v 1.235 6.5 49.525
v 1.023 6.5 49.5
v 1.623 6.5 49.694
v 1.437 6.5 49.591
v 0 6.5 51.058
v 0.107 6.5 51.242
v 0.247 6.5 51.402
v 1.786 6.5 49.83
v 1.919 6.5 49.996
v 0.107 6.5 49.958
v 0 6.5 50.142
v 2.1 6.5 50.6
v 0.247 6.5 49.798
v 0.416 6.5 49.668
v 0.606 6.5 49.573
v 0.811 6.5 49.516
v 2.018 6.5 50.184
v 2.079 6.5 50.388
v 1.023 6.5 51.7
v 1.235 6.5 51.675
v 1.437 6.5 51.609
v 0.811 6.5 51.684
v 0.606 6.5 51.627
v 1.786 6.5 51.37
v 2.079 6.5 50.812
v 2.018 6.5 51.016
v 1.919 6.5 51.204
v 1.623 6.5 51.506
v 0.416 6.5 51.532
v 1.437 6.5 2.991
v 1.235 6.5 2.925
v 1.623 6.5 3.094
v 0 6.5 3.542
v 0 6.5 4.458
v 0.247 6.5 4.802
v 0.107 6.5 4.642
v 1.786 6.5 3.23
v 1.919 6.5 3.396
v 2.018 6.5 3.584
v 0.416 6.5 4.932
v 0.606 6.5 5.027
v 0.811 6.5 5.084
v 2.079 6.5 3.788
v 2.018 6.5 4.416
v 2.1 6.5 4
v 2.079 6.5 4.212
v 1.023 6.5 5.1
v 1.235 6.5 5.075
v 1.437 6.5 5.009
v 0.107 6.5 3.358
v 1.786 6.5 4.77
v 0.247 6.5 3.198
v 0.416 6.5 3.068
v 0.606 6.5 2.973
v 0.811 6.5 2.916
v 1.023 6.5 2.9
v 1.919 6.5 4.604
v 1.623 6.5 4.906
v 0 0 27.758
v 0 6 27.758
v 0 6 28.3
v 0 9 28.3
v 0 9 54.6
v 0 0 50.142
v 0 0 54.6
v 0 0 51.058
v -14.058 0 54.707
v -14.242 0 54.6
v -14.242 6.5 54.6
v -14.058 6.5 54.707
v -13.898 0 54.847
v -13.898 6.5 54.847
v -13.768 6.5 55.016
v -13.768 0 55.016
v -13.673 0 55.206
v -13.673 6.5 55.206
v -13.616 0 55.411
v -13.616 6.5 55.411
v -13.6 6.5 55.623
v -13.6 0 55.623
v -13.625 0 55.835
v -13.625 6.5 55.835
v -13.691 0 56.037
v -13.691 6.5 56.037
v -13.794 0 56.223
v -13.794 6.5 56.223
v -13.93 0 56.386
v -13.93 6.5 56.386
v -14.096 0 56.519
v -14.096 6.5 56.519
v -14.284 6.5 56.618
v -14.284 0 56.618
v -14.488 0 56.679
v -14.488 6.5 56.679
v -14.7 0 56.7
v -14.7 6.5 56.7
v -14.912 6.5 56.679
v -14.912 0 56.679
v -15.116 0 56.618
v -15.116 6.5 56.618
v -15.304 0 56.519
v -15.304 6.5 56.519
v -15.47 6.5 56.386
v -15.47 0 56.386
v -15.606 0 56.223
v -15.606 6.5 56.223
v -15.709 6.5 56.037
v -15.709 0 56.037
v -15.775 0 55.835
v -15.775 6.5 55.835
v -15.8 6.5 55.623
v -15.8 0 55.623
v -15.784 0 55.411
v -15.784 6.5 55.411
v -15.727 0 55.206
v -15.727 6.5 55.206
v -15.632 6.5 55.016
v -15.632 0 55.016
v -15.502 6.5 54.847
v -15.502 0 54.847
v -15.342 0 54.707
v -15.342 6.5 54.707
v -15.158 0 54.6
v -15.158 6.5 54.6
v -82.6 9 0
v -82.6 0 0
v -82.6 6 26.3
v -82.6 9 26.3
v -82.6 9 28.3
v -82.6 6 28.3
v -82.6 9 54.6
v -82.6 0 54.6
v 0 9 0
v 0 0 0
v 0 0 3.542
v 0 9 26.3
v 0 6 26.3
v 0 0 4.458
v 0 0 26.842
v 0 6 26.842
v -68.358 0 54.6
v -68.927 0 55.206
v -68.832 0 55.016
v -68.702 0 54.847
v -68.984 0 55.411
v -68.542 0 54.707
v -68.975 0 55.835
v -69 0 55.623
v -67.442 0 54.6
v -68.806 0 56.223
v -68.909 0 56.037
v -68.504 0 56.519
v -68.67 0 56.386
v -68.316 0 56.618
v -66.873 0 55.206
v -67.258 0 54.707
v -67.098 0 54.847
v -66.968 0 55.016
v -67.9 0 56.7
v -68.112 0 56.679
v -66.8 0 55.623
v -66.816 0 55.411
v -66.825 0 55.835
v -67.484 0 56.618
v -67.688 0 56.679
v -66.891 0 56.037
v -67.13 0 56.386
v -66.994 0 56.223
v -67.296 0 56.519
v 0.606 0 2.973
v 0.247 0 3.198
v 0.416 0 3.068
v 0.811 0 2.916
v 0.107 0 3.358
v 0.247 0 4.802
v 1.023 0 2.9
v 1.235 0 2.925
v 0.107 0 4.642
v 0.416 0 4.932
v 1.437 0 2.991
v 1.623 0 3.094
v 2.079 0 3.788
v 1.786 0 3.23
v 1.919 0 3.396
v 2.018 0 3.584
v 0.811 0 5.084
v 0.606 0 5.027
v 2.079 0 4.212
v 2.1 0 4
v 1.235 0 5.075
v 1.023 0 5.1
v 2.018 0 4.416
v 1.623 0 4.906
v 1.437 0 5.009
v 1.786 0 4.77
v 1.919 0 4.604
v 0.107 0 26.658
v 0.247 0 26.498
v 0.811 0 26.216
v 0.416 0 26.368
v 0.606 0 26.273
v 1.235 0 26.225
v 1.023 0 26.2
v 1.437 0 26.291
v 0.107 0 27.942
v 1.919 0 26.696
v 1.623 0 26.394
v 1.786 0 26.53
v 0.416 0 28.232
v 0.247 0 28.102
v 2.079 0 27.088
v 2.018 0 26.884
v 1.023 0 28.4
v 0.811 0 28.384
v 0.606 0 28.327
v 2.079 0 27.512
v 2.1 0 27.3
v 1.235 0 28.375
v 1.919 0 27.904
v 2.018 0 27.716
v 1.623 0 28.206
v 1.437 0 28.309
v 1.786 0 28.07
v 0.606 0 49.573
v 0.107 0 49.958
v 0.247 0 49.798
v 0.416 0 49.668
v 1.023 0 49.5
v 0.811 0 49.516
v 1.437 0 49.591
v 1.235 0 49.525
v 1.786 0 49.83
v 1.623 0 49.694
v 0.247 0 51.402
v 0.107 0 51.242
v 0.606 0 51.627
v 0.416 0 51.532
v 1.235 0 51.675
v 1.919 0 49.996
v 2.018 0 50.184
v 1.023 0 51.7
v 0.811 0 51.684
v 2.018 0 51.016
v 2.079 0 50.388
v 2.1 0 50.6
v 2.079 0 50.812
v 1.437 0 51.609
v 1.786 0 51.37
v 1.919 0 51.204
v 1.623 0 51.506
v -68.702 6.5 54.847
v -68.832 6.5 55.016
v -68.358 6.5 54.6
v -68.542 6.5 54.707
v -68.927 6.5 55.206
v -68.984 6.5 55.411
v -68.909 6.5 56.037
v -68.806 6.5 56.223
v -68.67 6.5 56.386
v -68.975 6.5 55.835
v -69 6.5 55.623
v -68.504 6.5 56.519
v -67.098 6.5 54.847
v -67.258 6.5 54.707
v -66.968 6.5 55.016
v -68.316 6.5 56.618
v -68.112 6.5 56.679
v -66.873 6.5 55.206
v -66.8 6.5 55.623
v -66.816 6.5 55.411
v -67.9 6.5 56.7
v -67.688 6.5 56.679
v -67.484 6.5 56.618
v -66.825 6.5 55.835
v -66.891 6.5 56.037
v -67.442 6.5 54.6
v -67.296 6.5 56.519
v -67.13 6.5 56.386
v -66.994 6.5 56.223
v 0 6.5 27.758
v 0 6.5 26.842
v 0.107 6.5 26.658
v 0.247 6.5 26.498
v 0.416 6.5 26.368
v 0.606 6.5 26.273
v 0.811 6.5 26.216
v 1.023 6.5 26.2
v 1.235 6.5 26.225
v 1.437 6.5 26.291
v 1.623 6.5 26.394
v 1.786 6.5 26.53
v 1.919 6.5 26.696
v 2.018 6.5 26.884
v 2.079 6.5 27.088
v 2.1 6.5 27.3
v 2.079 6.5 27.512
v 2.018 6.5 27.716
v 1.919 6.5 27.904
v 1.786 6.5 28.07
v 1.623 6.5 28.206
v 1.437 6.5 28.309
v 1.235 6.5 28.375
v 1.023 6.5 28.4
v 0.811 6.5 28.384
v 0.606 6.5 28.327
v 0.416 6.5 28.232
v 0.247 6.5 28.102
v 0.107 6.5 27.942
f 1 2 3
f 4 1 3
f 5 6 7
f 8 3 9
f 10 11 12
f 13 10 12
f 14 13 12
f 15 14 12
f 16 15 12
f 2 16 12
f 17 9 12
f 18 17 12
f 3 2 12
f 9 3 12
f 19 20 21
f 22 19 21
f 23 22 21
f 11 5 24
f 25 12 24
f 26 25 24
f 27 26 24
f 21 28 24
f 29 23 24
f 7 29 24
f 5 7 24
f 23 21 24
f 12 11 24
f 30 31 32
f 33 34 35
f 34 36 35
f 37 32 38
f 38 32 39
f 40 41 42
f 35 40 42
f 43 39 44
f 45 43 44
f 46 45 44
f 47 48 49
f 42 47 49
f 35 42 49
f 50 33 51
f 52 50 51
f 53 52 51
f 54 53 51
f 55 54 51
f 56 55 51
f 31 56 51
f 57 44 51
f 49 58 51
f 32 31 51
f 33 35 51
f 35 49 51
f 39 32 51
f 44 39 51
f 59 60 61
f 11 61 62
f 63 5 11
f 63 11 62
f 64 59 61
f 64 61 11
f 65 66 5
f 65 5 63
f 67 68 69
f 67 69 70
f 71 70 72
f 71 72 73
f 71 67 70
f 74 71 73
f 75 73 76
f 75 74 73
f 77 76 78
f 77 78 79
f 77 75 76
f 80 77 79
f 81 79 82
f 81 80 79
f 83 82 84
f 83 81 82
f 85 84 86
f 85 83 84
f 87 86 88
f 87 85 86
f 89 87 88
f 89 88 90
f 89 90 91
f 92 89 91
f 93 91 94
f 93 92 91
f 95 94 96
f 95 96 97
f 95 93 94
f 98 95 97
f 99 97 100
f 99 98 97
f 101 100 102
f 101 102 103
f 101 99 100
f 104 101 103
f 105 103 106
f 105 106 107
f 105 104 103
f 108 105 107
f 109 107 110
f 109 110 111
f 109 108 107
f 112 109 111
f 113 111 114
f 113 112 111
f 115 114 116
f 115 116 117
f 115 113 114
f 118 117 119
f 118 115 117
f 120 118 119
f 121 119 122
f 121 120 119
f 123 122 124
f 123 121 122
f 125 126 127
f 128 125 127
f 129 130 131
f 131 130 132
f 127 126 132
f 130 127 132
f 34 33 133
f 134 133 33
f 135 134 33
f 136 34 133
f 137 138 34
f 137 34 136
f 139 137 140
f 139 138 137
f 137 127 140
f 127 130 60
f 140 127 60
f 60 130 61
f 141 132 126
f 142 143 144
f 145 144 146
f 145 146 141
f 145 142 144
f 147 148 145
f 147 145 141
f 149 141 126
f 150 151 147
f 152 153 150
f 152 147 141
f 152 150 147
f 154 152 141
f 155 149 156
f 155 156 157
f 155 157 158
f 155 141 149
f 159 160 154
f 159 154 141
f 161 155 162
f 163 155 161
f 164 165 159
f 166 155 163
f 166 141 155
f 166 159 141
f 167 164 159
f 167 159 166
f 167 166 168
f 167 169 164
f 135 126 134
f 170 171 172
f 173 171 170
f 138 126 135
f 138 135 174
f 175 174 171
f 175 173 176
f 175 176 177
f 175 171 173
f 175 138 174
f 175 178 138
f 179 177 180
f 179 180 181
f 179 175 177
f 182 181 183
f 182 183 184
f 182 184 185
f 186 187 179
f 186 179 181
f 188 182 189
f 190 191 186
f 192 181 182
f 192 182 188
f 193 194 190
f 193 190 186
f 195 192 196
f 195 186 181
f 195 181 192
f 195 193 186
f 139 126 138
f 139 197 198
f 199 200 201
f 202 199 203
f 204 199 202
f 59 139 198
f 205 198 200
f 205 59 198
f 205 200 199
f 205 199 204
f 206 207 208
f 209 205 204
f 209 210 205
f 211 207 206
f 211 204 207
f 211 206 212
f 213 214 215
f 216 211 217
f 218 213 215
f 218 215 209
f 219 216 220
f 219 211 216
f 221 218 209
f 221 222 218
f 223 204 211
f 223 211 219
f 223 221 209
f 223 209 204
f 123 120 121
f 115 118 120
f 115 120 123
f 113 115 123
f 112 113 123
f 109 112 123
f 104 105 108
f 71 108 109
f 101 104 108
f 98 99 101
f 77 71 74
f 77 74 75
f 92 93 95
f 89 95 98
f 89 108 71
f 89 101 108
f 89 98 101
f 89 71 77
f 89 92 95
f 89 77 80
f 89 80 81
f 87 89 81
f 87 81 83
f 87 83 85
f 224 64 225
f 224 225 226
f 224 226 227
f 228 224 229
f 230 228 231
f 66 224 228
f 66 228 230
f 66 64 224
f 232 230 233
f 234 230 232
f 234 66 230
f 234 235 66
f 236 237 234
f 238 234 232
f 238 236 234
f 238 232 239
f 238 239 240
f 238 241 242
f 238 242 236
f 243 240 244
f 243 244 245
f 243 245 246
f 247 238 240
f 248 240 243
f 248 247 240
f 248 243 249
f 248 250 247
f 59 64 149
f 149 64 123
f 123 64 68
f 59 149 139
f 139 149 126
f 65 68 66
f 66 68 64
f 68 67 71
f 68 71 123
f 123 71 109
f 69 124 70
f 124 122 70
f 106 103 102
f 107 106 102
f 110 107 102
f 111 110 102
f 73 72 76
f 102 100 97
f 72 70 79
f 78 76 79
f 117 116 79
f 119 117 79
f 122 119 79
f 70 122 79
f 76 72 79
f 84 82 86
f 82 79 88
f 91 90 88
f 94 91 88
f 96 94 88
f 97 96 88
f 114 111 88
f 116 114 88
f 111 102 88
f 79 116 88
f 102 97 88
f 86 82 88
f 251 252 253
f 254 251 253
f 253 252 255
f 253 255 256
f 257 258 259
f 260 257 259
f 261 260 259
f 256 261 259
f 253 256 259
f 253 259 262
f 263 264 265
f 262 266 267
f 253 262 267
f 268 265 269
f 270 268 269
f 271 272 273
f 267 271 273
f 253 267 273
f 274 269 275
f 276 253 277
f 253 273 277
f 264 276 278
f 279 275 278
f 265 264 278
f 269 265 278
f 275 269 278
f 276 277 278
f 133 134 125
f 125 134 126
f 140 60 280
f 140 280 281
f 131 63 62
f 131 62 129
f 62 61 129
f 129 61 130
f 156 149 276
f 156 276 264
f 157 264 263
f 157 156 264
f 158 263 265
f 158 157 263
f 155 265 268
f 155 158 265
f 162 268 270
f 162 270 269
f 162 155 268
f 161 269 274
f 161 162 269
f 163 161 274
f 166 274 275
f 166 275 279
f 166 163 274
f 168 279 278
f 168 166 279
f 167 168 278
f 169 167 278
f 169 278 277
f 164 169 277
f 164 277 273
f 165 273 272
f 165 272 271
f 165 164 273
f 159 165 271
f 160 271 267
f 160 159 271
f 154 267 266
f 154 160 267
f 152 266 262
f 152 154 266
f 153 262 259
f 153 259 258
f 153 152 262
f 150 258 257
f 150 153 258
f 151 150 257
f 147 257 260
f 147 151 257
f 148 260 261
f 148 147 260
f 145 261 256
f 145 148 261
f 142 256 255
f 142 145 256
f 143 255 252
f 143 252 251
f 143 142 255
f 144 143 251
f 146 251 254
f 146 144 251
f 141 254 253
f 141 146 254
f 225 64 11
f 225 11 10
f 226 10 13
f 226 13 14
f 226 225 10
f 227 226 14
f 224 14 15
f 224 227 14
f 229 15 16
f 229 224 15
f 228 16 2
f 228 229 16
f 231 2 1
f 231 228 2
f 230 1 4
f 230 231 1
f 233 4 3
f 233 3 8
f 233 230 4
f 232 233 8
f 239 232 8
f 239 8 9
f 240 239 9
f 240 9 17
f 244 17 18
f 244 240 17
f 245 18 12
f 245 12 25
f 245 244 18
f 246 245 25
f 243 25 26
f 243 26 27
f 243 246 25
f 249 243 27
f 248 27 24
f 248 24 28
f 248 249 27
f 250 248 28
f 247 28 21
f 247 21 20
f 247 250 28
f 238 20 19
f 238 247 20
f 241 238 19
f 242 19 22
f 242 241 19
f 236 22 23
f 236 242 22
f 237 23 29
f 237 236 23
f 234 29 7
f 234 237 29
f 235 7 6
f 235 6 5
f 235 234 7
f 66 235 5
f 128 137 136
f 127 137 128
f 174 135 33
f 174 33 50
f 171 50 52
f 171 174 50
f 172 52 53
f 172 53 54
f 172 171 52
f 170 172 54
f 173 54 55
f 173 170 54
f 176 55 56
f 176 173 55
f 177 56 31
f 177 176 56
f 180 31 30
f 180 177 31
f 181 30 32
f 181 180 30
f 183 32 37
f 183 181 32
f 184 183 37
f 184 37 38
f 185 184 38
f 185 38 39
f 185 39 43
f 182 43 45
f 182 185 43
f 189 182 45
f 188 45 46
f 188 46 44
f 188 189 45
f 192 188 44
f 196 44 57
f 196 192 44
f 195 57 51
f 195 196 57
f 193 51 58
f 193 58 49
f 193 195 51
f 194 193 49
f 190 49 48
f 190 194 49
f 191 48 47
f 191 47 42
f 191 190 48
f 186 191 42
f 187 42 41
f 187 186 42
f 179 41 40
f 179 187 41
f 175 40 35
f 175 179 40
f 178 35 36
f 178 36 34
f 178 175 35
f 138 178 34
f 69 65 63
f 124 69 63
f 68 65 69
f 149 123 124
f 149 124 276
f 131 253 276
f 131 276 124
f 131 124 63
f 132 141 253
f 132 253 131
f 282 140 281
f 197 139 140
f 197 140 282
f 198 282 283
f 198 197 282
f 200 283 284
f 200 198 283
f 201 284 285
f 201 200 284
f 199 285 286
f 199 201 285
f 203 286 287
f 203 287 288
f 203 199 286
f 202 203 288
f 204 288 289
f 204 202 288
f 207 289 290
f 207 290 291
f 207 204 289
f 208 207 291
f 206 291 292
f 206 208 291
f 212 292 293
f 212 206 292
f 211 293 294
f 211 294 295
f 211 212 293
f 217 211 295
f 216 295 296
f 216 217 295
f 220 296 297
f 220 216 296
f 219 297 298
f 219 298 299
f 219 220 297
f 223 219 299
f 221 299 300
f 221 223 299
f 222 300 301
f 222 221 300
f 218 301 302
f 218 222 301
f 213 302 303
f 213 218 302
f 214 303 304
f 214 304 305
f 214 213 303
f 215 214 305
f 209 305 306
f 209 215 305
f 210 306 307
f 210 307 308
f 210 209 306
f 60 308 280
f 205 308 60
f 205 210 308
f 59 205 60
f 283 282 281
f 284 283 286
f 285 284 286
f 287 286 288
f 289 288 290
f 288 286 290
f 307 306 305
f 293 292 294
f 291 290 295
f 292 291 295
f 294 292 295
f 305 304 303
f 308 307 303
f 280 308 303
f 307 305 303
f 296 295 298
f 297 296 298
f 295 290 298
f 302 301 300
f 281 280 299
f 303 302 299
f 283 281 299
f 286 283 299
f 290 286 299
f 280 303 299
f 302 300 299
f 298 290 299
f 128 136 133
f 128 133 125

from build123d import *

# Parameters (mm, degrees)
BOSS_EXTRUDE1_DEPTH = 6
SKETCH2_W           = 82.6
SKETCH2_H           = 26.3
BOSS_EXTRUDE2_DEPTH = 3
SKETCH3_W           = 82.6
SKETCH3_H           = 26.3
BOSS_EXTRUDE3_DEPTH = 3
BOSS_EXTRUDE4_DEPTH = 0.5
BOSS_EXTRUDE5_DEPTH = 6.5
BOSS_EXTRUDE6_DEPTH = 6.5
BOSS_EXTRUDE7_DEPTH = 6.5
BOSS_EXTRUDE8_DEPTH = 6.5


with BuildPart() as part:
    # Sketch1 → Boss-Extrude1 (new body)
    with BuildSketch(Plane.XZ):
        with BuildLine():
            Line((-82.6, 0), (0, 0))
            Line((0, 0), (0, 26.841742431))
            ThreePointArc((0, 26.841742431), (2.1, 27.3), (0, 27.758257569))
            Line((0, 27.758257569), (0, 54.6))
            Line((0, 54.6), (-82.6, 54.6))
            Line((-82.6, 54.6), (-82.6, 0))
        make_face()
    extrude(amount=-BOSS_EXTRUDE1_DEPTH)

    # Sketch2 → Boss-Extrude2 (add)
    with BuildSketch(Plane(origin=(0, 6, 0), x_dir=(-1, 0, 0), z_dir=(0, 1, 0))):
        with Locations((41.3, 13.15)):
            Rectangle(SKETCH2_W, SKETCH2_H)
    extrude(amount=BOSS_EXTRUDE2_DEPTH)

    # Sketch3 → Boss-Extrude3 (add)
    with BuildSketch(Plane(origin=(0, 6, 0), x_dir=(-1, 0, 0), z_dir=(0, 1, 0))):
        with Locations((41.3, 41.45)):
            Rectangle(SKETCH3_W, SKETCH3_H)
    extrude(amount=BOSS_EXTRUDE3_DEPTH)

    # Sketch4 → Boss-Extrude4 (add)
    with BuildSketch(Plane(origin=(0, 6, 0), x_dir=(-1, 0, 0), z_dir=(0, 1, 0))):
        with BuildLine():
            Line((0, 27.758257569), (0, 26.841742431))
            ThreePointArc((0, 26.841742431), (-2.1, 27.3), (0, 27.758257569))
        make_face()
    extrude(amount=BOSS_EXTRUDE4_DEPTH)

    # Sketch5 → Boss-Extrude5 (add)
    with BuildSketch(Plane.XZ):
        with BuildLine():
            Line((0, 4.458257629), (0, 3.54174249))
            ThreePointArc((0, 3.54174249), (2.1, 4.00000006), (0, 4.458257629))
        make_face()
    extrude(amount=-BOSS_EXTRUDE5_DEPTH)

    # Sketch6 → Boss-Extrude6 (add)
    with BuildSketch(Plane.XZ):
        with BuildLine():
            Line((0, 51.05825751), (0, 50.141742371))
            ThreePointArc((0, 50.141742371), (2.1, 50.59999994), (0, 51.05825751))
        make_face()
    extrude(amount=-BOSS_EXTRUDE6_DEPTH)

    # Sketch7 → Boss-Extrude7 (add)
    with BuildSketch(Plane.XZ):
        with BuildLine():
            Line((-68.358257569, 54.6), (-67.441742431, 54.6))
            ThreePointArc((-67.441742431, 54.6), (-67.9, 56.7), (-68.358257569, 54.6))
        make_face()
    extrude(amount=-BOSS_EXTRUDE7_DEPTH)

    # Sketch8 → Boss-Extrude8 (add)
    with BuildSketch(Plane.XZ):
        with BuildLine():
            Line((-15.158257569, 54.6), (-14.241742431, 54.6))
            ThreePointArc((-14.241742431, 54.6), (-14.7, 56.7), (-15.158257569, 54.6))
        make_face()
    extrude(amount=-BOSS_EXTRUDE8_DEPTH)


solid = part.part
